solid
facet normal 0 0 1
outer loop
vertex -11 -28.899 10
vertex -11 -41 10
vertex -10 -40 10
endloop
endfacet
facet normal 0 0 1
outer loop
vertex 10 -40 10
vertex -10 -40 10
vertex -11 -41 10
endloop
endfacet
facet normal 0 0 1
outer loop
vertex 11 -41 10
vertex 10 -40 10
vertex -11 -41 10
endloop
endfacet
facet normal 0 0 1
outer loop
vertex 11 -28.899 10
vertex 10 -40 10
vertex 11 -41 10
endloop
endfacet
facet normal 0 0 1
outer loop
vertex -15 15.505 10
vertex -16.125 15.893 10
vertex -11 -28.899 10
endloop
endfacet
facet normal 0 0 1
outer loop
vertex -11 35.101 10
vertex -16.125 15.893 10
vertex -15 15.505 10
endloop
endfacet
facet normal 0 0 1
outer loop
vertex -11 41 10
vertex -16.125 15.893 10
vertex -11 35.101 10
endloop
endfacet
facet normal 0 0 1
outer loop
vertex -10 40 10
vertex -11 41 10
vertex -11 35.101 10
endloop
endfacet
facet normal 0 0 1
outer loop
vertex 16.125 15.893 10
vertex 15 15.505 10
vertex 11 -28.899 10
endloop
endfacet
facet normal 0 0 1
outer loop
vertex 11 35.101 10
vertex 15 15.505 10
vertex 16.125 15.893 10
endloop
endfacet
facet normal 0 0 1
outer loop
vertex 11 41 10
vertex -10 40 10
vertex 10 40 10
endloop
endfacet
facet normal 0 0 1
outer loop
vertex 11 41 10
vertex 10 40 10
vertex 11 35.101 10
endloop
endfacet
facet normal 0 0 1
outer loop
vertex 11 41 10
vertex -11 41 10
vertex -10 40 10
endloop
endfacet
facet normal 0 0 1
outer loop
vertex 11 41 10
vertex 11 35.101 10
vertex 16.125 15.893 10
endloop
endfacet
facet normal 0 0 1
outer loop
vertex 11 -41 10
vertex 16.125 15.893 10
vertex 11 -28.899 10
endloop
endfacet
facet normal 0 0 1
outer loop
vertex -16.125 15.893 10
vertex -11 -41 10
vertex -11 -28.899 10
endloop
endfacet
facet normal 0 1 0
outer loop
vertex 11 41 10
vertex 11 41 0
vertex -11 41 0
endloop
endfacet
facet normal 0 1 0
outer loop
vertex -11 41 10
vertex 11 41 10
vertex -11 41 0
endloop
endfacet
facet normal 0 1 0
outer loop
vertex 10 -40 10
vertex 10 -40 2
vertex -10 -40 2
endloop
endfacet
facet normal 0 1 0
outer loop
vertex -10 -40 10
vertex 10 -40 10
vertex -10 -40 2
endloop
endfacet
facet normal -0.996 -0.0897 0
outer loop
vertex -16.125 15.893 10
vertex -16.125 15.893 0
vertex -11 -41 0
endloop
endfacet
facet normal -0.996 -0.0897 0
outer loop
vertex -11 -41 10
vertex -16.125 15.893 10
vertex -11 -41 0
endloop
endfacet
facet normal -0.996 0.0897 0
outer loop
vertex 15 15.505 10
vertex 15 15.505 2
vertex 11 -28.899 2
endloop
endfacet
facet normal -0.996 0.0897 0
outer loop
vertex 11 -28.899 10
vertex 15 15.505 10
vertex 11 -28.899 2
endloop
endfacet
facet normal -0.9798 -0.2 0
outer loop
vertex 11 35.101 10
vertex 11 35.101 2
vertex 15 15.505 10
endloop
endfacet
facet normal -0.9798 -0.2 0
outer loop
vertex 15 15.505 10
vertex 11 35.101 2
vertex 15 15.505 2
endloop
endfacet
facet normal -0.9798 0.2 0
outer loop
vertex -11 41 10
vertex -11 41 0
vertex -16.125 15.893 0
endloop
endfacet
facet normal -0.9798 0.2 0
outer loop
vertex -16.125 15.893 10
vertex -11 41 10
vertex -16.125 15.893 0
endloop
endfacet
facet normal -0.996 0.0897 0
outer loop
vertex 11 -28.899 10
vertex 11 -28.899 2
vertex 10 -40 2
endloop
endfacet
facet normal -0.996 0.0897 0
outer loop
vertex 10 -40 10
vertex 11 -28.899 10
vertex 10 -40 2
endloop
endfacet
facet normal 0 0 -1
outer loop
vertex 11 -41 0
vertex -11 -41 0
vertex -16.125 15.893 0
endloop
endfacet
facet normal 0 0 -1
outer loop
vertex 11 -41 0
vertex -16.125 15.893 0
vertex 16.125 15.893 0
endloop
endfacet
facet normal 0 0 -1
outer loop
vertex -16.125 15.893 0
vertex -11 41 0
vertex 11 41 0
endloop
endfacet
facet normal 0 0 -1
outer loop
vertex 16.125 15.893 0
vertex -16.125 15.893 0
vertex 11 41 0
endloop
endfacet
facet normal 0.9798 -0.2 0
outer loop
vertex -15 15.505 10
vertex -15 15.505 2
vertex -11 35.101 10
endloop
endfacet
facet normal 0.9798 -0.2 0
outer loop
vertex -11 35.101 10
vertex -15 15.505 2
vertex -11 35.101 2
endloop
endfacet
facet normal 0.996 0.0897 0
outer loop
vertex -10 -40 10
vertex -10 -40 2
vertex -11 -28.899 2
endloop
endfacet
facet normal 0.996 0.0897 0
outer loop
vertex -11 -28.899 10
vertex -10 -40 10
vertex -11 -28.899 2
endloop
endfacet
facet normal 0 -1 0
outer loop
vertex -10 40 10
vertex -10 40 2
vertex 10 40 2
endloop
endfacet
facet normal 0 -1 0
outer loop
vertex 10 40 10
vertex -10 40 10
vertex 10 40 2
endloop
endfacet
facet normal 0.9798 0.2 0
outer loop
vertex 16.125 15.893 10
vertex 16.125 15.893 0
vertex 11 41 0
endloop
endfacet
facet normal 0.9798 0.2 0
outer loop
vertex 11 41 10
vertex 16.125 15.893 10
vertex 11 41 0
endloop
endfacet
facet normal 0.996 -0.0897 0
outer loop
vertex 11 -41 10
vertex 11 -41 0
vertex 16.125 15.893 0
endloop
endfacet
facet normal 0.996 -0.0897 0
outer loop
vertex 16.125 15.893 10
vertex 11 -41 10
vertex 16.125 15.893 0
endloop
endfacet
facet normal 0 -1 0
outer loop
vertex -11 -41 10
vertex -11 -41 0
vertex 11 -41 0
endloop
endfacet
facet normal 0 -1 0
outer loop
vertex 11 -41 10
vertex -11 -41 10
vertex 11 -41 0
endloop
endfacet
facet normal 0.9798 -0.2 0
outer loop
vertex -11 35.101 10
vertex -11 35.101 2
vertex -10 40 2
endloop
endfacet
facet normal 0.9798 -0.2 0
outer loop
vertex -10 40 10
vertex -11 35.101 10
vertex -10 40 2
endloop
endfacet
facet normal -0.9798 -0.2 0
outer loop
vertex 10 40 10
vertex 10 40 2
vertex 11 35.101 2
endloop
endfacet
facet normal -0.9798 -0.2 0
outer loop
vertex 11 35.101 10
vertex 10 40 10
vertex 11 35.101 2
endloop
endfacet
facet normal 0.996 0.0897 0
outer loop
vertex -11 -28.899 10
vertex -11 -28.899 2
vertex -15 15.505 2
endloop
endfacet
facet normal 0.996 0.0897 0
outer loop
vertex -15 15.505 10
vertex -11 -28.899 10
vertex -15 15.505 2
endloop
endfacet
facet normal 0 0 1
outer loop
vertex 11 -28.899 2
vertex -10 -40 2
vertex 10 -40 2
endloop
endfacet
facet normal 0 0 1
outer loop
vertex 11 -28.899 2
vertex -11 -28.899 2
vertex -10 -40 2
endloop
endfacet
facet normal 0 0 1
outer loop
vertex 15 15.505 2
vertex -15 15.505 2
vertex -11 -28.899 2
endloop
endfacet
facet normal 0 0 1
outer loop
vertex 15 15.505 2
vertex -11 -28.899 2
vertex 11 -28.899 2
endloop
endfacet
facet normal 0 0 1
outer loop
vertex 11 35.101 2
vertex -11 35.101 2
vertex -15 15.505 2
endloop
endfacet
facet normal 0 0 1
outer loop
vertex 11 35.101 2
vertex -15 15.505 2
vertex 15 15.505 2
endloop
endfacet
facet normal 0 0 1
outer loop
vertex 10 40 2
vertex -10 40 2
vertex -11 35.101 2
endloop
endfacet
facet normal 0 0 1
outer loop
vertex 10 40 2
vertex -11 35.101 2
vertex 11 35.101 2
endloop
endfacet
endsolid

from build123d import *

# Parameters (mm, degrees)
F0_W     = 20
F0_H     = 80
F1_DEPTH = 2
F2_DEPTH = 10


with BuildPart() as f1:
    # F0 (on Top) → F1 (new body)
    with BuildSketch(Plane.XY):
        Rectangle(F0_W, F0_H)
        Polygon((-10, -40), (-10, 40), (-11, 35.101021), (-11, -28.898979), align=None)
        Polygon((11, 35.101021), (10, 40), (10, -40), (11, -28.898979), align=None)
        Polygon((-11, -28.898979), (-11, 35.101021), (-15, 15.505103), align=None)
        Polygon((15, 15.505103), (11, 35.101021), (11, -28.898979), align=None)
    extrude(amount=F1_DEPTH)

    # F0 (on Top) → F2 (join)
    with BuildSketch(Plane.XY):
        Polygon((-15, 15.505103), (-11, 35.101021), (-11, 41), (-16.125, 15.89273), (-11, -41), (-11, -28.898979), align=None)
        Polygon((-10, 40), (10, 40), (11, 35.101021), (11, 41), (-11, 41), (-11, 35.101021), align=None)
        Polygon((11, 41), (11, 35.101021), (15, 15.505103), (11, -28.898979), (11, -41), (16.125, 15.89273), align=None)
        Polygon((11, -28.898979), (10, -40), (-10, -40), (-11, -28.898979), (-11, -41), (11, -41), align=None)
    extrude(amount=F2_DEPTH)


solid = f1.part
